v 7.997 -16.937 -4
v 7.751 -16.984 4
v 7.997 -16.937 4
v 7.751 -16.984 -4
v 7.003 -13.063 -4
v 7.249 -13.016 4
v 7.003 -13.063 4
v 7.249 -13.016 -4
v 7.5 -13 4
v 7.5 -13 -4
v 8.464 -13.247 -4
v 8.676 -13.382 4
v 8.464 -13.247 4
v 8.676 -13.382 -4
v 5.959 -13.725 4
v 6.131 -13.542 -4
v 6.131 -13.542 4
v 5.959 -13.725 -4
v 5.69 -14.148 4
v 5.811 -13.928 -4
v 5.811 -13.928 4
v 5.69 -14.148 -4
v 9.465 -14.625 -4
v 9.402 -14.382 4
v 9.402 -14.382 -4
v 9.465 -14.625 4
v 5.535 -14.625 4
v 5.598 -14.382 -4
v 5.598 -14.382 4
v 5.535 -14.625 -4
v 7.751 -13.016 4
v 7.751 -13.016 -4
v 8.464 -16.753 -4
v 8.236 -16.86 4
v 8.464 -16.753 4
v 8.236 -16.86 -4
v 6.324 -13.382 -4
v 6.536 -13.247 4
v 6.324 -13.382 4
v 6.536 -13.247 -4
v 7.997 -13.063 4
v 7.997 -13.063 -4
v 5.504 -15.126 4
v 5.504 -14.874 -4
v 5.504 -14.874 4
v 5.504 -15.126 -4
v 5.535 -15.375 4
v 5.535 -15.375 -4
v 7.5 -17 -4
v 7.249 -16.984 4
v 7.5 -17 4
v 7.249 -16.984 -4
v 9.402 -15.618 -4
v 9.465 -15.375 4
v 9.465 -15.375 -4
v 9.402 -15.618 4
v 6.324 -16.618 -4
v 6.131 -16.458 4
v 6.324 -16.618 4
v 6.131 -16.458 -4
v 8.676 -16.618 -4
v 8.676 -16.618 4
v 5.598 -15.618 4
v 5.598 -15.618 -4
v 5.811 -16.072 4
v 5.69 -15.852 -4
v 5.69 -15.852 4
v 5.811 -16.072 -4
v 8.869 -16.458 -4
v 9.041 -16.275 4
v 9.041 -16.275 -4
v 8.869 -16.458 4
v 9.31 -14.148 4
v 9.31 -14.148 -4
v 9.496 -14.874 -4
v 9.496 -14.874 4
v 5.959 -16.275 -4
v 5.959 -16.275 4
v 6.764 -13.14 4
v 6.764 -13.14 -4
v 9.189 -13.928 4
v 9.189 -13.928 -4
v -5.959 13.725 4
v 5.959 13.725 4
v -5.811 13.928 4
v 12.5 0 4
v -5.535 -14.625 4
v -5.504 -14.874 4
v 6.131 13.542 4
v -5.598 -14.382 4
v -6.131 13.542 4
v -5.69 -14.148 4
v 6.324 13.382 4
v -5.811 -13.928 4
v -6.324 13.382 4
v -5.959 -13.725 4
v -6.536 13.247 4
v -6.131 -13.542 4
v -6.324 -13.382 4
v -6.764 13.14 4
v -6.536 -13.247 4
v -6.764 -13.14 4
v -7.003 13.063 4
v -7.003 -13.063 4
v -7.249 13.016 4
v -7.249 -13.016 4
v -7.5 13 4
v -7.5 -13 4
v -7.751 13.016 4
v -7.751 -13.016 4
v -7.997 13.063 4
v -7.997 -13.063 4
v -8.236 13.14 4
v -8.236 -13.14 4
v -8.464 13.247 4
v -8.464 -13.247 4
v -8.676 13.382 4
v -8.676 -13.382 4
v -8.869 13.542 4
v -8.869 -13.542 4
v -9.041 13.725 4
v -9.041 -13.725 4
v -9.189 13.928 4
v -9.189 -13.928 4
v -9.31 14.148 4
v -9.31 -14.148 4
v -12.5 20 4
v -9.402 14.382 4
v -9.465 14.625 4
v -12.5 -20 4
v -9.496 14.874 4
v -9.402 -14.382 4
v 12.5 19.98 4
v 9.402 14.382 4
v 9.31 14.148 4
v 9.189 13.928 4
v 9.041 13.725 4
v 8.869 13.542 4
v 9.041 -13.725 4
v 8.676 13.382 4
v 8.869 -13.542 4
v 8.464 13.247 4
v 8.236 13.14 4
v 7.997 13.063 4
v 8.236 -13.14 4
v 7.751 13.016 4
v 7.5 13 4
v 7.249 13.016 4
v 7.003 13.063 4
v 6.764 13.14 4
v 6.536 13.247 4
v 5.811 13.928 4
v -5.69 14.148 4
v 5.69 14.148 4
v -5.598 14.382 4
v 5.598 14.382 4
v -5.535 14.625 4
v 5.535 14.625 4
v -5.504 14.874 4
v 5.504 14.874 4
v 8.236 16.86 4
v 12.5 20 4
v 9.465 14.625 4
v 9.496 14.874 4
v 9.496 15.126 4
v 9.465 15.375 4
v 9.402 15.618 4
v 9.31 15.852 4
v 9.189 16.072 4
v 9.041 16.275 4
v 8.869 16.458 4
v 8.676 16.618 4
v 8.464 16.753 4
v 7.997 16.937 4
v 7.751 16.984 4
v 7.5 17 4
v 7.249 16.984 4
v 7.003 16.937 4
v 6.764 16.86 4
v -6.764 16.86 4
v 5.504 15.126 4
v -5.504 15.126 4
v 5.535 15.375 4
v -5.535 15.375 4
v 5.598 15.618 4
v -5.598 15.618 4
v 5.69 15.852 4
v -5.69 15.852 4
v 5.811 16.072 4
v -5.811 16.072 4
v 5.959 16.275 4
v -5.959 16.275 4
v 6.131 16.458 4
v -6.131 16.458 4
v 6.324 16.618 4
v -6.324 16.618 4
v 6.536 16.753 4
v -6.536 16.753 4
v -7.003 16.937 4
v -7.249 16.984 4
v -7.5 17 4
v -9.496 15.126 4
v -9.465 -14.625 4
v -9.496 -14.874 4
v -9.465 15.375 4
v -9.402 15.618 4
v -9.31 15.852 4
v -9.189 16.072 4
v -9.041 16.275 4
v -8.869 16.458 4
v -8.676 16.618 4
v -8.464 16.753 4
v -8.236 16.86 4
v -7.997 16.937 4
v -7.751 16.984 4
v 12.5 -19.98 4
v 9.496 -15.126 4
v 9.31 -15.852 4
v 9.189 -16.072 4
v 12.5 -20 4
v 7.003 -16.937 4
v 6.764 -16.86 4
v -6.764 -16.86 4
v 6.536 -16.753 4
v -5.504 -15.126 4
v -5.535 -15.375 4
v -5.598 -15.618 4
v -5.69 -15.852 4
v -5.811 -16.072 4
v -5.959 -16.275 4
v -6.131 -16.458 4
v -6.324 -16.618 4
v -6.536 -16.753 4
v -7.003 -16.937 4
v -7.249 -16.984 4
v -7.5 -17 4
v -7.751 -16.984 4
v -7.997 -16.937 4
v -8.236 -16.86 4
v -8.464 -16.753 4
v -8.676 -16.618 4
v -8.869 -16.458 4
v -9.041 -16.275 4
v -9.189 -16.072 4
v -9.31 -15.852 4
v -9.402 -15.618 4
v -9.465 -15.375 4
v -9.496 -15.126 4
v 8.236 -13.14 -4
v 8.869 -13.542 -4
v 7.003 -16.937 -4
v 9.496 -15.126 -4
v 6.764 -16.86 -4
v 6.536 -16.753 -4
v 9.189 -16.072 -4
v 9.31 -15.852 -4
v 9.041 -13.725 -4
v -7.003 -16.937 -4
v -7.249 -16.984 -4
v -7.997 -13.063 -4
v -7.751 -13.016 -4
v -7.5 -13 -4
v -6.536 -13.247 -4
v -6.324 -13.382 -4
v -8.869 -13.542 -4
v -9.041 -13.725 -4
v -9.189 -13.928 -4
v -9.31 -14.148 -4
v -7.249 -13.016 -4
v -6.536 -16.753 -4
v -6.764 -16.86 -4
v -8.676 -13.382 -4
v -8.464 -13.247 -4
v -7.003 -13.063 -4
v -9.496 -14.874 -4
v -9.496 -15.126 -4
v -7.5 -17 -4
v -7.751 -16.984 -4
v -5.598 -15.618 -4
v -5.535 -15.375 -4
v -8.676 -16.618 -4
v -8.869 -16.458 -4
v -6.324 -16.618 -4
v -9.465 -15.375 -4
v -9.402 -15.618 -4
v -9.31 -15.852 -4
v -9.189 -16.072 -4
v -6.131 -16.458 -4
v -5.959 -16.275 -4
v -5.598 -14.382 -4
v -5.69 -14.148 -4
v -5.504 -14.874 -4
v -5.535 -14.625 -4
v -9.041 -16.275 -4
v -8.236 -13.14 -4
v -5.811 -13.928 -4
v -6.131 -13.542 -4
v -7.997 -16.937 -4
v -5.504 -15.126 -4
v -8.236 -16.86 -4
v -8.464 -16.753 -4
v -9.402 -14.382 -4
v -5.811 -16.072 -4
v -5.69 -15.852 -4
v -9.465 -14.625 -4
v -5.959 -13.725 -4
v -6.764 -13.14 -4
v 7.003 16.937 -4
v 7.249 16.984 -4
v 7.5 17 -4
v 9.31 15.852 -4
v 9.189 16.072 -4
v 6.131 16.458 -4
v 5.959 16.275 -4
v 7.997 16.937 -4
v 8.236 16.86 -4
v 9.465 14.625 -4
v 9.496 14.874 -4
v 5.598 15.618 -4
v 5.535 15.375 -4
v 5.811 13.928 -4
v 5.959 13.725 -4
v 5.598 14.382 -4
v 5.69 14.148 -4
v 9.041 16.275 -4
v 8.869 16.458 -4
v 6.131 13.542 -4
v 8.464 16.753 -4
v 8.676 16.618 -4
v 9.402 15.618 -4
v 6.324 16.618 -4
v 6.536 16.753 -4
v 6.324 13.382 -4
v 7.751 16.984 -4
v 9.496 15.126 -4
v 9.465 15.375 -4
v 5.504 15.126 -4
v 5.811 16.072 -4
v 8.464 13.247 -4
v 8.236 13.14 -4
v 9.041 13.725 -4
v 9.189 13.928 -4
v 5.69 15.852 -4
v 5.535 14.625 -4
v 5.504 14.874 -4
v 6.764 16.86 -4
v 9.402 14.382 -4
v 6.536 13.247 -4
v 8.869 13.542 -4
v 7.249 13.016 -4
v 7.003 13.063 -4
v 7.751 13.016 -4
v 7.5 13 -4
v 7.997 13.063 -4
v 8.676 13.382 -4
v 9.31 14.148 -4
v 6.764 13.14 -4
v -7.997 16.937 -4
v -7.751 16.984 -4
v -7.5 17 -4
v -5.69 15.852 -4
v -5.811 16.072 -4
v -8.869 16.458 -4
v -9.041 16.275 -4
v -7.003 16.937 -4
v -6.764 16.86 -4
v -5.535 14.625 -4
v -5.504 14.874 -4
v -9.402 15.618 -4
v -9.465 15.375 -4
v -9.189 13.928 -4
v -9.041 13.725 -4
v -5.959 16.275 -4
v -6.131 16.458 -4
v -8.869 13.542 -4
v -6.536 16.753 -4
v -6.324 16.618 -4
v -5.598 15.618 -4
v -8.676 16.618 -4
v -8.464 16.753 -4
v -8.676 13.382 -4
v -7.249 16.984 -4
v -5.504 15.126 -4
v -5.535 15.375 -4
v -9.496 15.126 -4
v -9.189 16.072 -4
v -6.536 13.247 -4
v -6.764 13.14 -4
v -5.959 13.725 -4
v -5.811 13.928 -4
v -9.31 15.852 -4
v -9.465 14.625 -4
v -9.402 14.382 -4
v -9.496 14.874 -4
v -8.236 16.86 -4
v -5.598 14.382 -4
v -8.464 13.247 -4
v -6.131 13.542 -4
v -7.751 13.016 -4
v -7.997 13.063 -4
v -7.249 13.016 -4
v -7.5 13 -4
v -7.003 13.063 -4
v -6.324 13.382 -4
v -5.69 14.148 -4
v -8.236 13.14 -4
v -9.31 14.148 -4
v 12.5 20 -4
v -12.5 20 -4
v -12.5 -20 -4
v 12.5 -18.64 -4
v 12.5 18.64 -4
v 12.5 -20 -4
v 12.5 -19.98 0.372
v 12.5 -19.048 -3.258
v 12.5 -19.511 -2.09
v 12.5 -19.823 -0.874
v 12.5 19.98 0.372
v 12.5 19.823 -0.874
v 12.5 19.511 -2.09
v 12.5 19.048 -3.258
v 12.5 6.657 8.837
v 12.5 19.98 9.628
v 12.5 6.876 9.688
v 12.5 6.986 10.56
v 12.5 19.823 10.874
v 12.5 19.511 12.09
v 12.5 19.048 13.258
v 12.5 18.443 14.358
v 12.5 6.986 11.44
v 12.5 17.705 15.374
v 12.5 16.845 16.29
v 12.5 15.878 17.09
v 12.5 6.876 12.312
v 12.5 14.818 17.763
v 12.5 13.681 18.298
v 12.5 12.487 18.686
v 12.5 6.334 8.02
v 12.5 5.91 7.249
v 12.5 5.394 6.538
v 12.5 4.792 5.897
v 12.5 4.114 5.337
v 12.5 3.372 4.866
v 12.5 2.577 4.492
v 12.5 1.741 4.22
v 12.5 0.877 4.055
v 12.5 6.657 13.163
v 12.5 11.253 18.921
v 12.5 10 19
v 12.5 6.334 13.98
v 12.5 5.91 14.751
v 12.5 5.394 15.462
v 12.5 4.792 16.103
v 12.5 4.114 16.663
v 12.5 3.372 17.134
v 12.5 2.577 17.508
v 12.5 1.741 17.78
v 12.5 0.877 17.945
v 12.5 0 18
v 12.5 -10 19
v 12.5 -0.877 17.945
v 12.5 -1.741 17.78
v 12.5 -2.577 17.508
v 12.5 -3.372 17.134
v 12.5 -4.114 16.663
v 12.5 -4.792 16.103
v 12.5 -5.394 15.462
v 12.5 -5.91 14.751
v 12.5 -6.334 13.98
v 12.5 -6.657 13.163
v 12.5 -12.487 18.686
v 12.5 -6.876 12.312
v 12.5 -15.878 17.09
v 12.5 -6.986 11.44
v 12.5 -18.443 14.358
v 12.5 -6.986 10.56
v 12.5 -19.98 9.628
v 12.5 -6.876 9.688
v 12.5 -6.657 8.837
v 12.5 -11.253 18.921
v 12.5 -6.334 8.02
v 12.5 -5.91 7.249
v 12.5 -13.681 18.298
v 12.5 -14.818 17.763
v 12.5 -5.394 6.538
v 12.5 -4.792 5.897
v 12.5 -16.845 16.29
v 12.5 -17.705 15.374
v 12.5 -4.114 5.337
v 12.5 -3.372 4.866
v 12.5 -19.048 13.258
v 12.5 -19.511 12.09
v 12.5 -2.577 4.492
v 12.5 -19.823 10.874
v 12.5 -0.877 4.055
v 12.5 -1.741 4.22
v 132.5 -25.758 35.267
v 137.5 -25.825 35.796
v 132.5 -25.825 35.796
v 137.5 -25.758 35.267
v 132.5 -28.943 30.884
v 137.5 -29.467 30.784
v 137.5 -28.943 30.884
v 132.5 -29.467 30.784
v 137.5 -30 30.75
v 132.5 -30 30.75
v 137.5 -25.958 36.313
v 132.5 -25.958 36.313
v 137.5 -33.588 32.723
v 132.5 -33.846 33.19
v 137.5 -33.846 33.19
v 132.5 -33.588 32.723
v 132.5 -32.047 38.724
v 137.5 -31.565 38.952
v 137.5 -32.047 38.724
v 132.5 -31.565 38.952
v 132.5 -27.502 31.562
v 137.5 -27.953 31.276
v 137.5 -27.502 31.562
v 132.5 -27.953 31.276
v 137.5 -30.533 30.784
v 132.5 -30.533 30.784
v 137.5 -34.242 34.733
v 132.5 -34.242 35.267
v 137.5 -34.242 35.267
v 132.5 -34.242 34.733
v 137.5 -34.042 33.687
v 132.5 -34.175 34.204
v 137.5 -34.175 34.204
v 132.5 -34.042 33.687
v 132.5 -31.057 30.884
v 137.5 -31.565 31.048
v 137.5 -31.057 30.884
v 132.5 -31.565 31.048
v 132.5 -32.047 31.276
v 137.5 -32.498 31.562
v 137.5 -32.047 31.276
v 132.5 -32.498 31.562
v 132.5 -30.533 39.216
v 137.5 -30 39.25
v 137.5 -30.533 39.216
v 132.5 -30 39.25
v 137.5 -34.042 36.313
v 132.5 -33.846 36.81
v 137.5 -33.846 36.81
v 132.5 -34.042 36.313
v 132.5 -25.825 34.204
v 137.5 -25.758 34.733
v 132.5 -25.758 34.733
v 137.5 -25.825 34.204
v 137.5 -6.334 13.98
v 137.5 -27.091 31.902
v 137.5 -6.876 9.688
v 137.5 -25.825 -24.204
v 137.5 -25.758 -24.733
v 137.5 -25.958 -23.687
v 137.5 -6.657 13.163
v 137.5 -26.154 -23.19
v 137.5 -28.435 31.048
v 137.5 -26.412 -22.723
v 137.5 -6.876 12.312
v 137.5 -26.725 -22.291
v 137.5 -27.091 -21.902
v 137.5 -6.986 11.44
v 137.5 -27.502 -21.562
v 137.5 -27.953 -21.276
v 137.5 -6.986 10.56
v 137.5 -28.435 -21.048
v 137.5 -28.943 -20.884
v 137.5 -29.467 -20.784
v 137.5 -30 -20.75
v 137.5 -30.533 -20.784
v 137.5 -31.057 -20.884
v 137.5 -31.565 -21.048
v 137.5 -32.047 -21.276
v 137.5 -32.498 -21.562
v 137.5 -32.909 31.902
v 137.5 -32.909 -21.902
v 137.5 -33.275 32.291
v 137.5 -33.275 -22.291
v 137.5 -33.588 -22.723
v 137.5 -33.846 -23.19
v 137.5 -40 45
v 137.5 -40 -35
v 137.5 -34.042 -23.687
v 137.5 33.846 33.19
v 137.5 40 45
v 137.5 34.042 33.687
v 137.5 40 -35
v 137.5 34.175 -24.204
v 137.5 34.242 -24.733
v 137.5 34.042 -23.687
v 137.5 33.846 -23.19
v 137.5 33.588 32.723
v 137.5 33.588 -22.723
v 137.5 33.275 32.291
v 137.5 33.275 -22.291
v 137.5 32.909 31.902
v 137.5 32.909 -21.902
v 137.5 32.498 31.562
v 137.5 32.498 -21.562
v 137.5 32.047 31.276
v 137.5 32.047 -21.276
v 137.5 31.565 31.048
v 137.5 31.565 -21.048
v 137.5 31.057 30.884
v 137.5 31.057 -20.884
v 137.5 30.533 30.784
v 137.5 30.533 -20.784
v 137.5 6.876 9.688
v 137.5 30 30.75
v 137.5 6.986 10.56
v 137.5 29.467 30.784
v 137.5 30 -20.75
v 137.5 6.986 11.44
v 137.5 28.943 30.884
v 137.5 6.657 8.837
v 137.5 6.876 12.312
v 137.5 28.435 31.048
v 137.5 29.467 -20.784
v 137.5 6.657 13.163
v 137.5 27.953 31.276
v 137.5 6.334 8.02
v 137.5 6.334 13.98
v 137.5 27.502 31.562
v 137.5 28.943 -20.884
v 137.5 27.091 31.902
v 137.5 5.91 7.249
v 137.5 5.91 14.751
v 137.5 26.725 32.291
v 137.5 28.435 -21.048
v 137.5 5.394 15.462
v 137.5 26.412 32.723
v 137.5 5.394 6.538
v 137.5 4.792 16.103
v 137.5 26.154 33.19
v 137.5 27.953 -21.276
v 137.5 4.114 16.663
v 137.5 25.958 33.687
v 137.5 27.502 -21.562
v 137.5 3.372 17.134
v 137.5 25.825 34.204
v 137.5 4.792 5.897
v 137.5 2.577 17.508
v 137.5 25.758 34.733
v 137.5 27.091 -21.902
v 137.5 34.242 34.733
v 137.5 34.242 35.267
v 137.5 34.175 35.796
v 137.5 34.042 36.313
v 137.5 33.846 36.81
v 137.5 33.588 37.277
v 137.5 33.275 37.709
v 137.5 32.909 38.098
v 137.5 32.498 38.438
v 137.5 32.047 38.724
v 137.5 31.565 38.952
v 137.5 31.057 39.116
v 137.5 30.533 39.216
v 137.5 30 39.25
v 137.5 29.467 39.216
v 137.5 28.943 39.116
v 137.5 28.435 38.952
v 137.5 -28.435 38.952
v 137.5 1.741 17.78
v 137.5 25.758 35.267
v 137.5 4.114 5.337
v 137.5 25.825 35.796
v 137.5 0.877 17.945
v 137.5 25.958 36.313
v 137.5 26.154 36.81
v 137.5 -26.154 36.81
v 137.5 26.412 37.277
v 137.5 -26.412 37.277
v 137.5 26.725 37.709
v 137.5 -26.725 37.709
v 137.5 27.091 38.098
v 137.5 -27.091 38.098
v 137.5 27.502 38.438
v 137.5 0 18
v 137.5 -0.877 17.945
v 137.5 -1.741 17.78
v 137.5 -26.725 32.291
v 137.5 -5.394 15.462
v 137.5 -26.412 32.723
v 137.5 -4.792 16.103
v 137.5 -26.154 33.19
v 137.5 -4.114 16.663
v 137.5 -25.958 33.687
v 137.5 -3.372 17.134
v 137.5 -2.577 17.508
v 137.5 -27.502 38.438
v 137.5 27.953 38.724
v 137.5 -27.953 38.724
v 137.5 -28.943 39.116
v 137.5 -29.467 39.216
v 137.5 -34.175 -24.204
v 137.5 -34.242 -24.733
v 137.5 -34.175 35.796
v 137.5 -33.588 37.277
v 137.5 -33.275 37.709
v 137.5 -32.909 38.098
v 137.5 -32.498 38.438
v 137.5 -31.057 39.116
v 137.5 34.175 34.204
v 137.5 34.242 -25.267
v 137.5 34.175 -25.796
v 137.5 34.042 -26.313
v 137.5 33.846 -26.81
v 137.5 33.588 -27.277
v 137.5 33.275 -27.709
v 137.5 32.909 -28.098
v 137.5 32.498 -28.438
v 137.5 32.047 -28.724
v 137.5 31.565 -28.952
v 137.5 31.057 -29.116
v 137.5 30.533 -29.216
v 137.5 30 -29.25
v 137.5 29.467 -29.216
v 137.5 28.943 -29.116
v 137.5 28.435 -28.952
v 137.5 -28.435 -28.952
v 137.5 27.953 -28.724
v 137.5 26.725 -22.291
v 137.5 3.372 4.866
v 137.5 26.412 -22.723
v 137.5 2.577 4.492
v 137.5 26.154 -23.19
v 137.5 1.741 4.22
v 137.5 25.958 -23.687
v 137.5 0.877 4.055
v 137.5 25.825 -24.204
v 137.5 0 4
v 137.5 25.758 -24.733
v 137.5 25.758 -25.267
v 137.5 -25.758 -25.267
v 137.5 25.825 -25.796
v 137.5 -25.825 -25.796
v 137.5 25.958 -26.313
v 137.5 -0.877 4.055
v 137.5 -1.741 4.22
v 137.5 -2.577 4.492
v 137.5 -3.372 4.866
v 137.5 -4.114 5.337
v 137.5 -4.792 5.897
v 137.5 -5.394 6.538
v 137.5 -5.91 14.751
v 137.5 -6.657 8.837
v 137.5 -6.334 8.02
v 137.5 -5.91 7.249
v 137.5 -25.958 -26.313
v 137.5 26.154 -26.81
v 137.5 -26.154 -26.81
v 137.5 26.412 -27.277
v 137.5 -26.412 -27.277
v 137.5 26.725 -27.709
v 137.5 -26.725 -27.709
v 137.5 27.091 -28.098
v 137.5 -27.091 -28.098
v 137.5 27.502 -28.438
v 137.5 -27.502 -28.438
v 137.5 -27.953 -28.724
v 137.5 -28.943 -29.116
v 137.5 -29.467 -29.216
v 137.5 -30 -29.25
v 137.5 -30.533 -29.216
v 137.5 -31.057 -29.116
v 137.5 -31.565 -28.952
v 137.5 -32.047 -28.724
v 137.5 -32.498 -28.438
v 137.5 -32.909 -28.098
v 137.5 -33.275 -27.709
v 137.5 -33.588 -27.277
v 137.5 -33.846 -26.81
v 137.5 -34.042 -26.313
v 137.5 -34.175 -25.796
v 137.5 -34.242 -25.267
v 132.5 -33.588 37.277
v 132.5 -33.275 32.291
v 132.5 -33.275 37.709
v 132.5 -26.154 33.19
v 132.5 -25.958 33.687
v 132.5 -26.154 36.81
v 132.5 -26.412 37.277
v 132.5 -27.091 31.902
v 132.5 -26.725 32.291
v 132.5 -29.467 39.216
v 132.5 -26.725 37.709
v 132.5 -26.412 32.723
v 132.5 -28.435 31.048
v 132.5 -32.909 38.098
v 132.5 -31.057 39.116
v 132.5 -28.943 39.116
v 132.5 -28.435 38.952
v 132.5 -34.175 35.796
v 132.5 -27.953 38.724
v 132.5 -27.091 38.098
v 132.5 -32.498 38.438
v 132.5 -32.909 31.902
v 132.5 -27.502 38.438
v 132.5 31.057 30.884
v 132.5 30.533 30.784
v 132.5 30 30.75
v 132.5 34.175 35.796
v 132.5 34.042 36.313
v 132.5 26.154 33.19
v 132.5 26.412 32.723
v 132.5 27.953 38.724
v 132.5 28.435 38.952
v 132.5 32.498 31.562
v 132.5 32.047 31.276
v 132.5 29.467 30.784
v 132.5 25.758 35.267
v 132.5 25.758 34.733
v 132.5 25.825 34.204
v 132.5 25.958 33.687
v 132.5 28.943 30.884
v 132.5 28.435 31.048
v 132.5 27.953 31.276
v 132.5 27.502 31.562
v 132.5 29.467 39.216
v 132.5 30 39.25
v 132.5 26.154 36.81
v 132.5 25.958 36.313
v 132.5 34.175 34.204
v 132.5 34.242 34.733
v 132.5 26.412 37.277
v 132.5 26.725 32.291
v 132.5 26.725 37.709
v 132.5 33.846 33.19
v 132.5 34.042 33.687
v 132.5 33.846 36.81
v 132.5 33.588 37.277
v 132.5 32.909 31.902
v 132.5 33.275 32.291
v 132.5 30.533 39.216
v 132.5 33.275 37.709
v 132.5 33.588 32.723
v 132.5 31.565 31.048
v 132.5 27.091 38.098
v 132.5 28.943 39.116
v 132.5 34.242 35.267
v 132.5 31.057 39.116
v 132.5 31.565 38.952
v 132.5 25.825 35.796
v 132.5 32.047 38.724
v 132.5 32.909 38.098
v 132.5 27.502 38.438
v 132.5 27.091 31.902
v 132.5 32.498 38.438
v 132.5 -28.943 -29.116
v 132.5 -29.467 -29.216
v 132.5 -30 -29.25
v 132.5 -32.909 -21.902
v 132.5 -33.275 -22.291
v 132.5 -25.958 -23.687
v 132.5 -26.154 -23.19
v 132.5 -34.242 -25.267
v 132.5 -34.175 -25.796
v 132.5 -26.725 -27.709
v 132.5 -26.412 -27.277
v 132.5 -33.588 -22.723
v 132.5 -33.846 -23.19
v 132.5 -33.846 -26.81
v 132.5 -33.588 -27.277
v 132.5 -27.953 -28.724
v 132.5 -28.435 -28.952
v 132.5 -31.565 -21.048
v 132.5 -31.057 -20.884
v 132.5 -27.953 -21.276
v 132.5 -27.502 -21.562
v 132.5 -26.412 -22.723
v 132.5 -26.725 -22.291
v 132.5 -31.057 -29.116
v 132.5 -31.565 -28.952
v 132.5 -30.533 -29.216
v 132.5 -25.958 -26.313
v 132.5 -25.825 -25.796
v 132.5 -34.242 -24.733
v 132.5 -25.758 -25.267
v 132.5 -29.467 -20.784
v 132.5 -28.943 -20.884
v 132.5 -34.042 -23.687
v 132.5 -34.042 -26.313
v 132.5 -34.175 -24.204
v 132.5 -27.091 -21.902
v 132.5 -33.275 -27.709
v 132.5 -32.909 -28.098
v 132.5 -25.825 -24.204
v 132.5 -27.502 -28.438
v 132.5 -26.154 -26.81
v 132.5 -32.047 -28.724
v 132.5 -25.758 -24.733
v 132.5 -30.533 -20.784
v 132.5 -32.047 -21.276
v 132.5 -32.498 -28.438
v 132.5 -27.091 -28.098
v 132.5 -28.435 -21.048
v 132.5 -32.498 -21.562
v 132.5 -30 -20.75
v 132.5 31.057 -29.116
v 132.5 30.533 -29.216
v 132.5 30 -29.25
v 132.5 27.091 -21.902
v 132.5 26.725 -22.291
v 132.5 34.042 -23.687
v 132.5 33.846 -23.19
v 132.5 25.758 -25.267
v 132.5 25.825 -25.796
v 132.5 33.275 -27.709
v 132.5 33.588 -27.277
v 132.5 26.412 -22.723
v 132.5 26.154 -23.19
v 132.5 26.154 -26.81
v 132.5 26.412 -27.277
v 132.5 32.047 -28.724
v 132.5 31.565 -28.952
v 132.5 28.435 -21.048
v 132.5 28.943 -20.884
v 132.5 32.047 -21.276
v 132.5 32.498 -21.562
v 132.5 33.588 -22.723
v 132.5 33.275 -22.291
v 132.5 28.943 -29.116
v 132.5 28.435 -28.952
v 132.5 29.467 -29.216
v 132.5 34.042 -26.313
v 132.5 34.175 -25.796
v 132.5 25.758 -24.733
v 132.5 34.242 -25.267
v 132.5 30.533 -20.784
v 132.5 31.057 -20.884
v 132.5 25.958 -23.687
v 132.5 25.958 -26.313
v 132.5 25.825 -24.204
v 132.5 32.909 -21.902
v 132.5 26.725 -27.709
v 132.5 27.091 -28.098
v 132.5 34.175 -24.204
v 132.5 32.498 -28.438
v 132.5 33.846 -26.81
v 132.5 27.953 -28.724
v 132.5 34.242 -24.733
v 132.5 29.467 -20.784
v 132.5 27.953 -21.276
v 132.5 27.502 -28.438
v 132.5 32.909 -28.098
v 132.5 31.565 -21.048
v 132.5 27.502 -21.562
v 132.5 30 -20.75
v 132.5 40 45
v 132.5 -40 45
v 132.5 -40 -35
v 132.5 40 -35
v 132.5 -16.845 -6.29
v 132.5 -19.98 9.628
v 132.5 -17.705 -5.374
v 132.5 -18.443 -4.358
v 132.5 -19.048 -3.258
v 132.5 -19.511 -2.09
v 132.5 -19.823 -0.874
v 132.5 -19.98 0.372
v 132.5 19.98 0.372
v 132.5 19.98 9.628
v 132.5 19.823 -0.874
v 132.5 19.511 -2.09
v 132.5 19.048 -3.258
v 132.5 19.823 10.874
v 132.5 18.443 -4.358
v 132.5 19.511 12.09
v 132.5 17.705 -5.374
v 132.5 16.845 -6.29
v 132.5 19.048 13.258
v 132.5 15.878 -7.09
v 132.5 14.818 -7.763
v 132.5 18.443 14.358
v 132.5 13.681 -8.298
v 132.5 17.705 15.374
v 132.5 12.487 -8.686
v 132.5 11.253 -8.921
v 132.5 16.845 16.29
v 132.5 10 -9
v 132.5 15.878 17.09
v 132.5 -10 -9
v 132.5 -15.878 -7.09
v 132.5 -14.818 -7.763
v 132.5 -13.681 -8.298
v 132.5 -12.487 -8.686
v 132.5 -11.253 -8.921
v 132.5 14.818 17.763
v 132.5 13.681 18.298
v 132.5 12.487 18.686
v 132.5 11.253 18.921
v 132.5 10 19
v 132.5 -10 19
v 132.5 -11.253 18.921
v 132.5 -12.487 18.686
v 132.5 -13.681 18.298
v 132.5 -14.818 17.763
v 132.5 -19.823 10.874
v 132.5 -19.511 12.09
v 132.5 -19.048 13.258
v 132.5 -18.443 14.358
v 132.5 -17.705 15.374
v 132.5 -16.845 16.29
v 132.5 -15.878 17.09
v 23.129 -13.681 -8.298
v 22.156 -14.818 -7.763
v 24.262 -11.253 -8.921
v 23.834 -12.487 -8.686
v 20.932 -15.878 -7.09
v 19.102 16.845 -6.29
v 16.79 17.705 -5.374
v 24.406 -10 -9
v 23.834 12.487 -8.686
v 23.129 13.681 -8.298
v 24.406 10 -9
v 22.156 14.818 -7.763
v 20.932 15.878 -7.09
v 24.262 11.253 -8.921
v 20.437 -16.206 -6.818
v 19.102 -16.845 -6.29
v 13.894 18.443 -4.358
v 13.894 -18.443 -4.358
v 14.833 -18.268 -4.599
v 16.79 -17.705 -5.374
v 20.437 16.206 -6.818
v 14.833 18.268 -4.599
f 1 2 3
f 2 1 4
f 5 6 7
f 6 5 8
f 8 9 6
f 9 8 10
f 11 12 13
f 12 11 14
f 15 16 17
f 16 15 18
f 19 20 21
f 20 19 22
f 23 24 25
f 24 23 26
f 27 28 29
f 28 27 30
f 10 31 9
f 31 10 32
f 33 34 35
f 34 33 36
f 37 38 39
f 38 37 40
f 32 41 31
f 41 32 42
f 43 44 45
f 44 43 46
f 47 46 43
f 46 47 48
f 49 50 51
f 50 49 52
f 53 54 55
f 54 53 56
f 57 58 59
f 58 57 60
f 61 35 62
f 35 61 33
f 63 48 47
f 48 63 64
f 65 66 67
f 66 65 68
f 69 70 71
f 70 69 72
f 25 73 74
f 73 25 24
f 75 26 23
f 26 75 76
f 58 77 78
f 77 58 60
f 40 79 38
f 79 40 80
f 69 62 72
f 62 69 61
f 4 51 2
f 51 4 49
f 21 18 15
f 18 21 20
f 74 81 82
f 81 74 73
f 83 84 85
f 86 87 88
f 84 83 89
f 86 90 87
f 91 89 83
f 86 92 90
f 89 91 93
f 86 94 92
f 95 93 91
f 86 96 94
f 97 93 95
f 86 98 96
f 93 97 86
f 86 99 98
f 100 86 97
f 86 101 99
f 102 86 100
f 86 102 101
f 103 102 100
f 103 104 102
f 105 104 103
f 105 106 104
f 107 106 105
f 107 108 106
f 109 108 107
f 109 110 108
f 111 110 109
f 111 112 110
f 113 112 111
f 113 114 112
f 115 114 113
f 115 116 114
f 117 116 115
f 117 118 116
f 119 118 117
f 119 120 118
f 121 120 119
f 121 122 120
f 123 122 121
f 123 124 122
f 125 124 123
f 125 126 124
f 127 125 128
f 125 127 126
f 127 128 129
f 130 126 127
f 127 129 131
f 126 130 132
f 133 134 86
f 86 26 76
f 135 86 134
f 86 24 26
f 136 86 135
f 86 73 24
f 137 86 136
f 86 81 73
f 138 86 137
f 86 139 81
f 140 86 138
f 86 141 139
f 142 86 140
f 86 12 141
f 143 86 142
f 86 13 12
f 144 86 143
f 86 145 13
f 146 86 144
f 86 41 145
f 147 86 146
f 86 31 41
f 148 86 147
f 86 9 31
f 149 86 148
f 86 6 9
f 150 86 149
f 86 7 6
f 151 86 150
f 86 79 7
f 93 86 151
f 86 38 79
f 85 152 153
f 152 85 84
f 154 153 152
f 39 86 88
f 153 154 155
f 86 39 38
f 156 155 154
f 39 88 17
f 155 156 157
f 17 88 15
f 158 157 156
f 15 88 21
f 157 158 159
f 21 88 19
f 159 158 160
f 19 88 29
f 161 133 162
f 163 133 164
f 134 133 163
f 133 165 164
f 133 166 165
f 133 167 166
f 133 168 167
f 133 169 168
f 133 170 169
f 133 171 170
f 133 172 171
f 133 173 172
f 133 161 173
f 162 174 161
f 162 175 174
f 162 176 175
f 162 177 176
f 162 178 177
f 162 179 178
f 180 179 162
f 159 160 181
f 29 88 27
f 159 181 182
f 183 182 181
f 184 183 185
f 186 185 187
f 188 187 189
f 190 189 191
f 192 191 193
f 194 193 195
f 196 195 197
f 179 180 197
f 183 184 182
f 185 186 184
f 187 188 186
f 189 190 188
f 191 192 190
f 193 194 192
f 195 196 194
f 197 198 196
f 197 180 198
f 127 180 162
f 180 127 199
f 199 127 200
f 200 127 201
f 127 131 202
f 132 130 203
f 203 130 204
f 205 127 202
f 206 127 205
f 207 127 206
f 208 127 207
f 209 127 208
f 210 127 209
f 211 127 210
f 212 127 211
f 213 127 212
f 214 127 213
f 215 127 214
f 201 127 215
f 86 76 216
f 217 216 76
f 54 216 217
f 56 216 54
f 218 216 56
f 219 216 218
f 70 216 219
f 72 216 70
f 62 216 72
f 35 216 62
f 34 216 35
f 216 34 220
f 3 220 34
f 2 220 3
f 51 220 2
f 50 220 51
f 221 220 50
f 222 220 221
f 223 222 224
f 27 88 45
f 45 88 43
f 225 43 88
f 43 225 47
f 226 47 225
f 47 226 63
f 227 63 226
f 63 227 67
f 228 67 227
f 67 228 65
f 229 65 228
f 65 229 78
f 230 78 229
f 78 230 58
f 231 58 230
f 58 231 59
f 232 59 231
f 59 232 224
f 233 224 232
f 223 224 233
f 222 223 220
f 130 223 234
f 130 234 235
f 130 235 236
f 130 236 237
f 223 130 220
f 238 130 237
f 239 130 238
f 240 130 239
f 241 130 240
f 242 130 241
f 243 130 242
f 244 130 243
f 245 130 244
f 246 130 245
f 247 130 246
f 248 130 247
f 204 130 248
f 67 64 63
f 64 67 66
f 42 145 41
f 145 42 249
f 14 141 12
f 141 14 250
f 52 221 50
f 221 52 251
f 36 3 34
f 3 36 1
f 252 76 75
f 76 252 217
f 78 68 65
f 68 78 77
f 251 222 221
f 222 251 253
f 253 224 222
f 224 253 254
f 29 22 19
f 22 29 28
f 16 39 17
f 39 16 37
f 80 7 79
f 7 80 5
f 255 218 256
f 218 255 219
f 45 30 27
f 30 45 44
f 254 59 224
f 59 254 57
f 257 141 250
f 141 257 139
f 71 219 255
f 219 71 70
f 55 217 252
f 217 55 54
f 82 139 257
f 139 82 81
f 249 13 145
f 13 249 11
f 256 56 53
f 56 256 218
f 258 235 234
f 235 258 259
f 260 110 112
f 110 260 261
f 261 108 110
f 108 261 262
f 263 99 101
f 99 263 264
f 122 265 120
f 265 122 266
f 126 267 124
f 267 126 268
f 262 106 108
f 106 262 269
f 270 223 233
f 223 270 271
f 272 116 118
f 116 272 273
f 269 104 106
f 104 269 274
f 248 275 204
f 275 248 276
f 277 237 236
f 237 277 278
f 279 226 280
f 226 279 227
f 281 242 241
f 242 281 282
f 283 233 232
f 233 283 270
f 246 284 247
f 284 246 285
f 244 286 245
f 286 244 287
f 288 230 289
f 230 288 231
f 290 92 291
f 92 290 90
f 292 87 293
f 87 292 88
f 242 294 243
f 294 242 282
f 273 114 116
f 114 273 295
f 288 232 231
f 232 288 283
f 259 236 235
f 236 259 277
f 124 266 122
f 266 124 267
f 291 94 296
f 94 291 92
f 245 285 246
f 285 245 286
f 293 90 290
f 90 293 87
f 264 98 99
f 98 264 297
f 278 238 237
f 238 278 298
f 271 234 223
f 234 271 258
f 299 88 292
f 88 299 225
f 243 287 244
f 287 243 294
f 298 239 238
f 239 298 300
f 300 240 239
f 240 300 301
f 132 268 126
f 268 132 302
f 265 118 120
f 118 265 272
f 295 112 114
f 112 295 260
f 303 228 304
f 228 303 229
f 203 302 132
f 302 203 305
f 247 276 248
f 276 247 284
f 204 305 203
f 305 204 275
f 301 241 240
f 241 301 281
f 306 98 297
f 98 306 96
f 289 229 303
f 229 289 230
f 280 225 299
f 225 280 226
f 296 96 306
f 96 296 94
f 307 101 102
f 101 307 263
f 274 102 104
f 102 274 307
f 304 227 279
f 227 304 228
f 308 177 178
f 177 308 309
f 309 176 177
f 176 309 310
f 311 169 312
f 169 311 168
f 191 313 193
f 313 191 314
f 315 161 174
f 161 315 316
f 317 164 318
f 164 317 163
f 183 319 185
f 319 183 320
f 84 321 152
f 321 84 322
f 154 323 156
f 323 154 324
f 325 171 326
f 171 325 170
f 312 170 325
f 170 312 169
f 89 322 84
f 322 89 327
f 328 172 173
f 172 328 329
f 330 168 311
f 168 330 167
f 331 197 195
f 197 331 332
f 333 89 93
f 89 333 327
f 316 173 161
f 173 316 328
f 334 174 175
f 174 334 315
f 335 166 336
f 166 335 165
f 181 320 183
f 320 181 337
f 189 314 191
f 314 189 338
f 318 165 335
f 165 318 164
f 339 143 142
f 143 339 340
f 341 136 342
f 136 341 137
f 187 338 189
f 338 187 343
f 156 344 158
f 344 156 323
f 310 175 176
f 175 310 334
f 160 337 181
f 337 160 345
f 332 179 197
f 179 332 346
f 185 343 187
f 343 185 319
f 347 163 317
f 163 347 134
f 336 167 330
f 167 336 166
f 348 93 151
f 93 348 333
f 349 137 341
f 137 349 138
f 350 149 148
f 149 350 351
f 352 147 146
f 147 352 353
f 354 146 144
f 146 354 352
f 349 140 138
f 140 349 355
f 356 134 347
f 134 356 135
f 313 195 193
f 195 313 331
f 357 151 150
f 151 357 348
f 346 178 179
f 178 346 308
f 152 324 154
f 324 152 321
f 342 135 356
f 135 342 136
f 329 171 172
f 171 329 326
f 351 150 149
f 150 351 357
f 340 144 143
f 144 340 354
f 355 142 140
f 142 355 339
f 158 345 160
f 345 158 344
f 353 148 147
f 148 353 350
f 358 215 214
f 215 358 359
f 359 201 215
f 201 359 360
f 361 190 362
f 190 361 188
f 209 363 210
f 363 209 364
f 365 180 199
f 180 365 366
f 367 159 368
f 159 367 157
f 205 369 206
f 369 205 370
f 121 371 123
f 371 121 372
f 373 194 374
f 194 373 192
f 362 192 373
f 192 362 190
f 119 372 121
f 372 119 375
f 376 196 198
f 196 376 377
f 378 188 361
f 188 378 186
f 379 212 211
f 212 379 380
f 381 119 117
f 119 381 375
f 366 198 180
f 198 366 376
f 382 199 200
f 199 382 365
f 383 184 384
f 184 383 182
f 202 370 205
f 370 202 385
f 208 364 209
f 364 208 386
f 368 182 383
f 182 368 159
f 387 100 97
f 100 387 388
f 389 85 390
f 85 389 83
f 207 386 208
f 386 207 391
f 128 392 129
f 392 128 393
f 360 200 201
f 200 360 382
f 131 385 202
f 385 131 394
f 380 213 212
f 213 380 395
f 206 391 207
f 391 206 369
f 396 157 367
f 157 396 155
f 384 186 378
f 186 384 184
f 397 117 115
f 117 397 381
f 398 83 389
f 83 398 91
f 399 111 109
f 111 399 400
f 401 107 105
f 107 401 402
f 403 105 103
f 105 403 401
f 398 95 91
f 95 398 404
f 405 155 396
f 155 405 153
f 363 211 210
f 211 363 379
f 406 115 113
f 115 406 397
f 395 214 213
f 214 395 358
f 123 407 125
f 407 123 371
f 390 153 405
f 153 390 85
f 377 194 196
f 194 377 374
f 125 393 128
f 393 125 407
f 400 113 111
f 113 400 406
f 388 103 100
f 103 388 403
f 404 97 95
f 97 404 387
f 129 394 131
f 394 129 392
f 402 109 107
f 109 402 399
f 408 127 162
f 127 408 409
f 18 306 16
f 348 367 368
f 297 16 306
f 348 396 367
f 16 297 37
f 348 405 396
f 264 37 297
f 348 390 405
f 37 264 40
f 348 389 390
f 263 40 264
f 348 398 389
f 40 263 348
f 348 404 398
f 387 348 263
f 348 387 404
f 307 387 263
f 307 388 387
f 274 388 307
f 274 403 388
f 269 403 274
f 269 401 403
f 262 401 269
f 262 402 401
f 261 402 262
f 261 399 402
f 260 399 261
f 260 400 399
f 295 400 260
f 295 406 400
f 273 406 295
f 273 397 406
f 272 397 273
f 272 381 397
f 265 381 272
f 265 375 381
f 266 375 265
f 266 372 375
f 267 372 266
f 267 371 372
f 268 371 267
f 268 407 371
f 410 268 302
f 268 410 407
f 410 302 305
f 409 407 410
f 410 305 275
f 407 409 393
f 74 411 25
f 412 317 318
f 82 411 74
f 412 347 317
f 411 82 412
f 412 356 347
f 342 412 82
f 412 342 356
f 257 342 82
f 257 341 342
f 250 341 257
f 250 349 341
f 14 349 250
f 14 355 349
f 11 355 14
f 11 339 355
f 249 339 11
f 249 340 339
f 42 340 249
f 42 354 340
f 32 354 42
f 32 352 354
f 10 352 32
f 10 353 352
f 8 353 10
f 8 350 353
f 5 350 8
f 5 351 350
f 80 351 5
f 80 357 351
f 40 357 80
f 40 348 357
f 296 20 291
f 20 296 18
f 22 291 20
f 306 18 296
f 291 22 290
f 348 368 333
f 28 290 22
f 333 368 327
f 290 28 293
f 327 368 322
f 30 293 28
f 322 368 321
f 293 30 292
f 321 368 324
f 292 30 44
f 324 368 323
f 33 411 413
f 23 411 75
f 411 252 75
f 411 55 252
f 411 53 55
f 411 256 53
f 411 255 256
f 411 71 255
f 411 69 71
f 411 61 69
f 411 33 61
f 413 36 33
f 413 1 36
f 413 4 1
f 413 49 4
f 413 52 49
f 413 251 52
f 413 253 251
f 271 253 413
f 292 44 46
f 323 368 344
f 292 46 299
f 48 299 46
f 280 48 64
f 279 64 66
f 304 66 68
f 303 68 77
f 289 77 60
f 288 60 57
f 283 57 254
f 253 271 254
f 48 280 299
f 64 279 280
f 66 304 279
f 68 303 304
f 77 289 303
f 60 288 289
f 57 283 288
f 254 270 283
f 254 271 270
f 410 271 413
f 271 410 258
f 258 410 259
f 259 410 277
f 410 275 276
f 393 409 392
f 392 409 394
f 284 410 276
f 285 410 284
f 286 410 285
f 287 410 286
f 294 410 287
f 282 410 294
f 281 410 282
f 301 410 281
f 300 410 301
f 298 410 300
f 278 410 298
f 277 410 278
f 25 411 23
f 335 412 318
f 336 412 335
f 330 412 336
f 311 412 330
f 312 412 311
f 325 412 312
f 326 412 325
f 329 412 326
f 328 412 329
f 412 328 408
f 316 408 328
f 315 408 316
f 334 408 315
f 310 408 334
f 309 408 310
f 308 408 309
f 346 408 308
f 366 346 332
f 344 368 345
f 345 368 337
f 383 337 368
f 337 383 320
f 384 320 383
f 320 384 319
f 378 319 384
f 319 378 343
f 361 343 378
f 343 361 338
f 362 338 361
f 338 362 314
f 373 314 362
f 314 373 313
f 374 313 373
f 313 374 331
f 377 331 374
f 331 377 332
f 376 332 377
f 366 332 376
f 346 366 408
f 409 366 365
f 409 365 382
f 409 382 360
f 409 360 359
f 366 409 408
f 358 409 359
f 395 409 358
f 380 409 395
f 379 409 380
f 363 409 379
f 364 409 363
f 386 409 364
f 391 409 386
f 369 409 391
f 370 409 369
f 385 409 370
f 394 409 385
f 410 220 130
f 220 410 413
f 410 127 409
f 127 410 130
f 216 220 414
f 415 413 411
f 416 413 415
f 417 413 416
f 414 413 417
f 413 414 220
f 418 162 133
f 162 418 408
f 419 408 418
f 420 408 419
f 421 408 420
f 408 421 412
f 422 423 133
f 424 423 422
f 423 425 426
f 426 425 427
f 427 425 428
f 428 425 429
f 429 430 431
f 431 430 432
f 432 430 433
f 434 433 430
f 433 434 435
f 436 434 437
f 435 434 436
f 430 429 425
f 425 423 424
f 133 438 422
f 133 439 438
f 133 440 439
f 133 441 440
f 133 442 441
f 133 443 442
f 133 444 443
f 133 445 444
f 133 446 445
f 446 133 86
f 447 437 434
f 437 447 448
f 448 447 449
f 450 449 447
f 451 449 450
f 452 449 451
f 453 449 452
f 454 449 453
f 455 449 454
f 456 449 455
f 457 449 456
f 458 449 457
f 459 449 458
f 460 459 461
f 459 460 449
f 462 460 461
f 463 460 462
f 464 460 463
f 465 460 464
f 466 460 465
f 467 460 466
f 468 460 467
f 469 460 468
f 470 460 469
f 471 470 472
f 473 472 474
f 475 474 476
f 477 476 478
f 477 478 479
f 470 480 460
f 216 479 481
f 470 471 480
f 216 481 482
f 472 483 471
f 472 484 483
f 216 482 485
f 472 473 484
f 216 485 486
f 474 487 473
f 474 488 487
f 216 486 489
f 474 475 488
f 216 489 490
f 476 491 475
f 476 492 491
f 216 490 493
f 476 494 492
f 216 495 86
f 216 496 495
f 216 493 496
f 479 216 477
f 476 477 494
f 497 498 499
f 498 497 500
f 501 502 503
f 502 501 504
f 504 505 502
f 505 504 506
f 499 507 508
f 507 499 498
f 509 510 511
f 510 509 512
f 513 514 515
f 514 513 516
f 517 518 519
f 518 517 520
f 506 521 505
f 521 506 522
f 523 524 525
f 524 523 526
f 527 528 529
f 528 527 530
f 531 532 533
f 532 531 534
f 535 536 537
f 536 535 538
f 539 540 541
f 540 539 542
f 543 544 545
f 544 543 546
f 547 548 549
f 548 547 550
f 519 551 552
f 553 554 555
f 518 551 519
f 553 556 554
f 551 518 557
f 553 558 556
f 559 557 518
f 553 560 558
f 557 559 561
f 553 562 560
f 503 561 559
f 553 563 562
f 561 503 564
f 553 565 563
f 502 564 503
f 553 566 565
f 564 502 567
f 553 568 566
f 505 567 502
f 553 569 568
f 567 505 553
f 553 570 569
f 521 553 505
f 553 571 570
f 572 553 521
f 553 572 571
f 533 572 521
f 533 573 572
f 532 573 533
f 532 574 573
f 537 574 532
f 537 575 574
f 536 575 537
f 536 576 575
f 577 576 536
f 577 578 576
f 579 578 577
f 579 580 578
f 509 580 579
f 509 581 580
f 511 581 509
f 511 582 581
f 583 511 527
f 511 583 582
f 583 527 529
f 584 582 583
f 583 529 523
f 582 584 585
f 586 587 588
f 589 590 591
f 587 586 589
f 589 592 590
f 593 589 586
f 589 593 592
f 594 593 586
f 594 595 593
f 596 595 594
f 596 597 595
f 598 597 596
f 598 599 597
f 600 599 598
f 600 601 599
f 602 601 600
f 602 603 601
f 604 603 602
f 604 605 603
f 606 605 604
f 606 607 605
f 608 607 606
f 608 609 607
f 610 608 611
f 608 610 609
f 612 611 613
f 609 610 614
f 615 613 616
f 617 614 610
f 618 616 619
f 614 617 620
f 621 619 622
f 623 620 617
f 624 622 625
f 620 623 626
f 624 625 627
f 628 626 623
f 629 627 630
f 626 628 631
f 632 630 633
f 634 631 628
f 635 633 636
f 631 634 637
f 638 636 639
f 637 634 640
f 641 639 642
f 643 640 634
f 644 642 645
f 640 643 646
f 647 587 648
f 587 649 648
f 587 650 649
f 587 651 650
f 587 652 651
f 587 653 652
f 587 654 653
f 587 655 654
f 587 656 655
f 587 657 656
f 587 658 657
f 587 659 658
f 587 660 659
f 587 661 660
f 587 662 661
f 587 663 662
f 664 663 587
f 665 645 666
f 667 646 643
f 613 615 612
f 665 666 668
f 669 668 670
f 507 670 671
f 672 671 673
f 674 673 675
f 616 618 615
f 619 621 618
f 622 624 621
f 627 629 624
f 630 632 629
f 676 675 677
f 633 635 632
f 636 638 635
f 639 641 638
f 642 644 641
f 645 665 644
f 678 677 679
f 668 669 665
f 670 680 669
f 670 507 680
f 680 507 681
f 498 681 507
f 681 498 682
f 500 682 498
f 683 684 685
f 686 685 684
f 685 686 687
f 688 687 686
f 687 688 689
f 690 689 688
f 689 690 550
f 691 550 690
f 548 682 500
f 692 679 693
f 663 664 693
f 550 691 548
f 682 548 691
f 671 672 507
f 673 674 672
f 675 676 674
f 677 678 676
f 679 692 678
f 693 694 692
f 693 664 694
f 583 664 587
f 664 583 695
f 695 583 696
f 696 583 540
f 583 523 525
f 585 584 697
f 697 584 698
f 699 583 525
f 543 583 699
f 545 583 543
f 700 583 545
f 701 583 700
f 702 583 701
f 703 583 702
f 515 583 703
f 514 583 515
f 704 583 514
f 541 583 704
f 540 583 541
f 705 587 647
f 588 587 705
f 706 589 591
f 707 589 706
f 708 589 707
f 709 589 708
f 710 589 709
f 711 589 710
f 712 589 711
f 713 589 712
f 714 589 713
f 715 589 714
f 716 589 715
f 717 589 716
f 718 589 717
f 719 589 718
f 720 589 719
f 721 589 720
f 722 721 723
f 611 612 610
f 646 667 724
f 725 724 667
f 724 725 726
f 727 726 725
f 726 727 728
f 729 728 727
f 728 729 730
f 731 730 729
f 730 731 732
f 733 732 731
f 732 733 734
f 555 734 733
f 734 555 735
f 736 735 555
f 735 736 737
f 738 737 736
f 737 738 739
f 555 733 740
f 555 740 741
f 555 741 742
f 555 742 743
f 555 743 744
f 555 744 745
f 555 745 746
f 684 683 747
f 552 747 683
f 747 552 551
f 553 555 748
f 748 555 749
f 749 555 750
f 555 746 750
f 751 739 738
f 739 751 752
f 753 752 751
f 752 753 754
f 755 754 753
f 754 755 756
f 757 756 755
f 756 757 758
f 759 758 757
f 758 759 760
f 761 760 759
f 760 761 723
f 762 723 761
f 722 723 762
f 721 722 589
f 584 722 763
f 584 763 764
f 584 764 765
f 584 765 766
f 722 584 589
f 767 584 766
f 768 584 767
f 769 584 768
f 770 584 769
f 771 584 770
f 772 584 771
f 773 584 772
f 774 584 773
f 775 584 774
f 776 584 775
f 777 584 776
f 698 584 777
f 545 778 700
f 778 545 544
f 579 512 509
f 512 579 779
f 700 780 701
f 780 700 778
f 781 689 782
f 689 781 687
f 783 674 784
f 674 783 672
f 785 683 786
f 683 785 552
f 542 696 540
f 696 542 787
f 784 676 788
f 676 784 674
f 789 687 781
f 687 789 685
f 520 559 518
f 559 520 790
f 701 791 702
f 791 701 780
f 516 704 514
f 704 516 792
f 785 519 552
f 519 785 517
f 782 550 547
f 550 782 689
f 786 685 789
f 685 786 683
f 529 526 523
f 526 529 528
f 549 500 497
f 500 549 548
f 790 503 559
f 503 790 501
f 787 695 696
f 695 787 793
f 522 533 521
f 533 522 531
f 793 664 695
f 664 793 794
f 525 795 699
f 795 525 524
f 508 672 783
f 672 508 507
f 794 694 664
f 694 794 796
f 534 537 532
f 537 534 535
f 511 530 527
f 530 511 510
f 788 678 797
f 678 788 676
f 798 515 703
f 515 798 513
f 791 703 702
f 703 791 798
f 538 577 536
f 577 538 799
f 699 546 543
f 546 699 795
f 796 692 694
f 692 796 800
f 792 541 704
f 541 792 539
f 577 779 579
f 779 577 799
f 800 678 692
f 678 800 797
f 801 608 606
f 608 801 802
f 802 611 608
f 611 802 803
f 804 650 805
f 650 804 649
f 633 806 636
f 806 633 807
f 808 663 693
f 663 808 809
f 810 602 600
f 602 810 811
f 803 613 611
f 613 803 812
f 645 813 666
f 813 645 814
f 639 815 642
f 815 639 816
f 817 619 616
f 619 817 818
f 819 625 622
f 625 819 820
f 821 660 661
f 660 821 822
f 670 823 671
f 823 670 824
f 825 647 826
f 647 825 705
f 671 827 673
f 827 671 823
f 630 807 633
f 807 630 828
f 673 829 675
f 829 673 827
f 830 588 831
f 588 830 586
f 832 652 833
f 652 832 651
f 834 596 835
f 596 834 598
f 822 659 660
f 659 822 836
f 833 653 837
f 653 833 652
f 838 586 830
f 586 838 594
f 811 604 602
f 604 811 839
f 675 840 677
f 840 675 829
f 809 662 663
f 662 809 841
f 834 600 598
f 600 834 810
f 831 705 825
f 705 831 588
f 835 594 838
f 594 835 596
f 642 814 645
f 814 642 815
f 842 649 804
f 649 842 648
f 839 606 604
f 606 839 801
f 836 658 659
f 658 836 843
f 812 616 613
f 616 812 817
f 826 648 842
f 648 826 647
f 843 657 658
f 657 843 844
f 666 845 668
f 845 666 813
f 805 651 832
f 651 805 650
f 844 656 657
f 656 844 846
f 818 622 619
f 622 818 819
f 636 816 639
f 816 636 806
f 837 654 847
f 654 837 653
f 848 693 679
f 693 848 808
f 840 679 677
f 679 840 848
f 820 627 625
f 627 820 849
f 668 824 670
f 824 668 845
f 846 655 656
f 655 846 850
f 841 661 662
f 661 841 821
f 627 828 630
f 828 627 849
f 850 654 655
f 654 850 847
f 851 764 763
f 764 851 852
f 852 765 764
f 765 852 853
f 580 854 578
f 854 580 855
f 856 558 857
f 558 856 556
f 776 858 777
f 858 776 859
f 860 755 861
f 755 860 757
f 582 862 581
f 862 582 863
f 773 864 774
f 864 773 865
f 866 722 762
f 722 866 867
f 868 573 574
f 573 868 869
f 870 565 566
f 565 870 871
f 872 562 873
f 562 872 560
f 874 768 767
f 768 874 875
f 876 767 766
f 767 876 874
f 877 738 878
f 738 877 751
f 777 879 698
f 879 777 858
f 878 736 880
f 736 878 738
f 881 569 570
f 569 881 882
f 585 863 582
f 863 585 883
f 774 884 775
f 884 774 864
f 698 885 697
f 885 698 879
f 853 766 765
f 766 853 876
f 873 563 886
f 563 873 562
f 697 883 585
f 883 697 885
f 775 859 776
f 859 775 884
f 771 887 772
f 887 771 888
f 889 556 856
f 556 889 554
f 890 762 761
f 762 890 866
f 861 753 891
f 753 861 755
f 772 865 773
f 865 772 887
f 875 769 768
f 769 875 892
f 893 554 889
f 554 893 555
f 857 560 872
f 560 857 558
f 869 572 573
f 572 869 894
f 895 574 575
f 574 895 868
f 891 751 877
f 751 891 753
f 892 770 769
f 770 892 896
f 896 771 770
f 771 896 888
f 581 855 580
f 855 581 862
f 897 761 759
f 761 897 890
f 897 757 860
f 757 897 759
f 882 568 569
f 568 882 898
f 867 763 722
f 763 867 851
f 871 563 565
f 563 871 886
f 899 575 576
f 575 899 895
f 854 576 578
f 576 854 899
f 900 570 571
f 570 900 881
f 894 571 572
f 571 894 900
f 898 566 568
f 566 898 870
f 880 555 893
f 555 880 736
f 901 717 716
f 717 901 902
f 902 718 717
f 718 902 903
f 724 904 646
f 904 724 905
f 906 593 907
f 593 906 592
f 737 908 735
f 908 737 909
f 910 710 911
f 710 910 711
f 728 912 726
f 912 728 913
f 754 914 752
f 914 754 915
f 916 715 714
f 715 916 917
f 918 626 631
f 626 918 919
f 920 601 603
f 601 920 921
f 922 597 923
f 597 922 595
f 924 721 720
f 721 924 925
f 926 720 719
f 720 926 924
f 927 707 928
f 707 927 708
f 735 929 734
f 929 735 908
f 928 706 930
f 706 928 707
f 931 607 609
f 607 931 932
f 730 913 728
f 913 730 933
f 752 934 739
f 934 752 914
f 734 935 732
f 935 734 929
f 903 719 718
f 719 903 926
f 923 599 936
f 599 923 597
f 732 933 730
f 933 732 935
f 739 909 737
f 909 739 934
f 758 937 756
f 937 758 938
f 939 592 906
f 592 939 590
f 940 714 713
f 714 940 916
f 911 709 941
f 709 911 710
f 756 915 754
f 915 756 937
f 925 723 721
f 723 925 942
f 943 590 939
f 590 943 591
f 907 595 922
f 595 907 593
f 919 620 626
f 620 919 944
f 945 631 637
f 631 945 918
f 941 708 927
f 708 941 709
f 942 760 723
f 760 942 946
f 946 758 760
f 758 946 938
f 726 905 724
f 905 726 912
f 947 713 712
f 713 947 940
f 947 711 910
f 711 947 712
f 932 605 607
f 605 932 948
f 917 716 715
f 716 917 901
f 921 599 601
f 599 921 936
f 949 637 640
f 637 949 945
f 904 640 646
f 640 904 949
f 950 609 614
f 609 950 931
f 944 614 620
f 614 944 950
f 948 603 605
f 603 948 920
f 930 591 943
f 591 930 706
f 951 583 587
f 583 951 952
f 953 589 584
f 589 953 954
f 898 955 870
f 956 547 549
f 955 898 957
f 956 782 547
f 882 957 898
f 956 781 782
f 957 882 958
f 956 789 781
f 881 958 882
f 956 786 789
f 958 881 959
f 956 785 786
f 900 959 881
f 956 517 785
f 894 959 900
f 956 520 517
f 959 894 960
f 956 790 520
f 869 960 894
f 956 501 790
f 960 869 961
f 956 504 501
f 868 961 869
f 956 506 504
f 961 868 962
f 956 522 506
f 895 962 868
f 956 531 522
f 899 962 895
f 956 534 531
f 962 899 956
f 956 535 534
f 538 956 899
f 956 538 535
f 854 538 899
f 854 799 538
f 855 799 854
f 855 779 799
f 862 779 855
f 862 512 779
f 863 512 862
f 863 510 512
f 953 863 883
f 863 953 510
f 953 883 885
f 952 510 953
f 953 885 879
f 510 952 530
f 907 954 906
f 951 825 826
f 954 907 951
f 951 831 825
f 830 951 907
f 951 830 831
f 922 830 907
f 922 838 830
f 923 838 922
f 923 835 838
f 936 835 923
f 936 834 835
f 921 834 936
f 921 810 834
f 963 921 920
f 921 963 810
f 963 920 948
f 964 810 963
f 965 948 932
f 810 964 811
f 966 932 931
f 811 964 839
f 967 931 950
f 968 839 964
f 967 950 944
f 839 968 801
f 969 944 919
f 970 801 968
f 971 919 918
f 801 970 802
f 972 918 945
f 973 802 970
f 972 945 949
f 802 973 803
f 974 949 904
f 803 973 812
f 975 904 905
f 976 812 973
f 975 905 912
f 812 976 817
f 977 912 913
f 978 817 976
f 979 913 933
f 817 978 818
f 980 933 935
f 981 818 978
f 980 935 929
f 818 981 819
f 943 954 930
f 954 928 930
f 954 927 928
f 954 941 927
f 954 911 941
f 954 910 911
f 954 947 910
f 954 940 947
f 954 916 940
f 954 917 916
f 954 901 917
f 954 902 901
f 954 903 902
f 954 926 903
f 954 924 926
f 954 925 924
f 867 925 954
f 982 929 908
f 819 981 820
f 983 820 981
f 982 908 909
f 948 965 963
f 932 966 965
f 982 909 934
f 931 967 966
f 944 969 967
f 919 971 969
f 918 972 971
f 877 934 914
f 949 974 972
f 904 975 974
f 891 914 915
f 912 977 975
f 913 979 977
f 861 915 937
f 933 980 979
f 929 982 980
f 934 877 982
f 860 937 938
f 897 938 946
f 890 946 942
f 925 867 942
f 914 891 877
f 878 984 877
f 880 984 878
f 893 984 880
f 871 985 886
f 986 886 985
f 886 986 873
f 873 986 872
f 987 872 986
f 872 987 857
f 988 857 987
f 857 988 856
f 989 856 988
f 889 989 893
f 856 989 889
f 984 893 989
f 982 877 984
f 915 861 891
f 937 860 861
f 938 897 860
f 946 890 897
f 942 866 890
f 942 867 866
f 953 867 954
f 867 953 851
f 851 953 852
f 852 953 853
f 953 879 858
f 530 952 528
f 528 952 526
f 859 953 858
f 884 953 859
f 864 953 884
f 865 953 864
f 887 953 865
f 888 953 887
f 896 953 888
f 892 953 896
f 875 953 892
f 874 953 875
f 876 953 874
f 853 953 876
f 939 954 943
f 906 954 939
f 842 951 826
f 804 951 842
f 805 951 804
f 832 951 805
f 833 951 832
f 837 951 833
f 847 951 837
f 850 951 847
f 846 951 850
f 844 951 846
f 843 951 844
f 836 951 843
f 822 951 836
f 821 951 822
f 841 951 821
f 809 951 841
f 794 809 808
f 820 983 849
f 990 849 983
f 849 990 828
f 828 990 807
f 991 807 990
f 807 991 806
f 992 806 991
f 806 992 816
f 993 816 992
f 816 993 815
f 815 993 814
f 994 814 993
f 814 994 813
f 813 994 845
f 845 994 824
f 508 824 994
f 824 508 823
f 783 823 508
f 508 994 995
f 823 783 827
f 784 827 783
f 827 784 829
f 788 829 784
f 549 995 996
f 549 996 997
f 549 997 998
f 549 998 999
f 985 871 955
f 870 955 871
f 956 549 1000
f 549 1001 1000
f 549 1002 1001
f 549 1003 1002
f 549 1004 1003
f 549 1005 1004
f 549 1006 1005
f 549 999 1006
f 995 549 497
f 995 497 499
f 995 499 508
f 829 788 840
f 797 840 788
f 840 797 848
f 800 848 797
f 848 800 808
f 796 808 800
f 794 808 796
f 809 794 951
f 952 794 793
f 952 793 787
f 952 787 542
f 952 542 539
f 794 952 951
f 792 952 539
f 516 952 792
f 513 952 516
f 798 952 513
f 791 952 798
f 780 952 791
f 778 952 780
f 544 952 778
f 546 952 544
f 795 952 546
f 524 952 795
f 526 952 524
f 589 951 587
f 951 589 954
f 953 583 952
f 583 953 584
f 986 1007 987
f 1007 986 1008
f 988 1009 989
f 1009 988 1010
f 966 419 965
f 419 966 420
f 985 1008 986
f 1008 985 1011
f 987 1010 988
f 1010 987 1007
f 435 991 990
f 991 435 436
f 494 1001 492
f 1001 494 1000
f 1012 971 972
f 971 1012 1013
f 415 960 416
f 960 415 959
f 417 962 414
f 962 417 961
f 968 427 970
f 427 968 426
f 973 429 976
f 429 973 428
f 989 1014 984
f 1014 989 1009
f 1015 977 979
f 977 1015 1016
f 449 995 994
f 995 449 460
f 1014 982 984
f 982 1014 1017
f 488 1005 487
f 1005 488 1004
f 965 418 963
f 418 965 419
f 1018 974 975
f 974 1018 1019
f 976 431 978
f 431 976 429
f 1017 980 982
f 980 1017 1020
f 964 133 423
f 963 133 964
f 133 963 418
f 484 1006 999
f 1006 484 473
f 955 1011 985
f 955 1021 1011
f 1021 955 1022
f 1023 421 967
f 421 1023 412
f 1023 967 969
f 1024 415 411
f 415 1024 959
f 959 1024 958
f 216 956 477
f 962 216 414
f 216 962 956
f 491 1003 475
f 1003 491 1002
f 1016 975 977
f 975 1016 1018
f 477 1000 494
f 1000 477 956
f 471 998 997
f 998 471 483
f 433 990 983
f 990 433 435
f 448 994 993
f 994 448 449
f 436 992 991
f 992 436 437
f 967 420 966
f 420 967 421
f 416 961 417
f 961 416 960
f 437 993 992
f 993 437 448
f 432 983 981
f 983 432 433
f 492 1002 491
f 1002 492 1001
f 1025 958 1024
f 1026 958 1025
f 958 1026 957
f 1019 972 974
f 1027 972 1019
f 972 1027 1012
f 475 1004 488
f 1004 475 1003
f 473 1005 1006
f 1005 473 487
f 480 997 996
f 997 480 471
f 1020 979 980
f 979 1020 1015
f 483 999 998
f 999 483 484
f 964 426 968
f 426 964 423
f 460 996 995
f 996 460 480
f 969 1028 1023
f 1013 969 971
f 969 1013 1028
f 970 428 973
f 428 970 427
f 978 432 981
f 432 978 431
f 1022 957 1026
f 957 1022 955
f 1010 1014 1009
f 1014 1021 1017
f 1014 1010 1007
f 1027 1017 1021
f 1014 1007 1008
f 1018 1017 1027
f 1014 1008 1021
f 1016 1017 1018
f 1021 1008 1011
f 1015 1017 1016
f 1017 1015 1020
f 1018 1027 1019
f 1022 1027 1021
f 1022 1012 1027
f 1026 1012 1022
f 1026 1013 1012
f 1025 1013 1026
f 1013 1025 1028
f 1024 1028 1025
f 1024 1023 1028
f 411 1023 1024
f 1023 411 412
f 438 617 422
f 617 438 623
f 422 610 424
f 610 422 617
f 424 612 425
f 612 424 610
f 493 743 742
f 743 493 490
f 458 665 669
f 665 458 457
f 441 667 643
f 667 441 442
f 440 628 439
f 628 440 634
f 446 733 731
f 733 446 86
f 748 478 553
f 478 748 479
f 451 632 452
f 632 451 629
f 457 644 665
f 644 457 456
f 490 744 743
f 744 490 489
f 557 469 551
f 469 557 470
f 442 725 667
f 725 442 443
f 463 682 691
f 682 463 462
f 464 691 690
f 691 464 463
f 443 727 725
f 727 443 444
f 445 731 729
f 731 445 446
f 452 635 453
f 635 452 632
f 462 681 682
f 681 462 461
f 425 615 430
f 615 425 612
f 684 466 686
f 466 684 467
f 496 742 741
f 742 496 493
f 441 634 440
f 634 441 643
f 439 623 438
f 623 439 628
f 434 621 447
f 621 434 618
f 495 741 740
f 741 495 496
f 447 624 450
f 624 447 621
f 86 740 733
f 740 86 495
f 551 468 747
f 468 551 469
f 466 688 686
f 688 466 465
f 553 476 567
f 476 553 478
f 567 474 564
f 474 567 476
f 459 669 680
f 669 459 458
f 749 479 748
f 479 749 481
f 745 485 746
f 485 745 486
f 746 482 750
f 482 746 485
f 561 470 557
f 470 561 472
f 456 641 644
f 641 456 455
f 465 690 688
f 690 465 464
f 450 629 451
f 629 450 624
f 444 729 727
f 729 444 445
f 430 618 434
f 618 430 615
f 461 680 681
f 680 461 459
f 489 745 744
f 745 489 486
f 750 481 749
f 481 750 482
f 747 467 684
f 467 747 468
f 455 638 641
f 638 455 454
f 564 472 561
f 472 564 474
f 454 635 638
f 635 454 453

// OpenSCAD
$fn=50;

module corner_holes(x_dist, y_dist, radius, depth){
    for(i = [0:1]){
        for(j = [0:1]){
            translate([i * x_dist - x_dist / 2, j * y_dist - y_dist / 2, 0])
            cylinder(depth, r1=radius, r2=radius, center=true);
        }
    }
}

module rounded_cube(width, length, height, corner_radius){
    translate([length / 2, corner_radius, height / 2 - corner_radius])
    rotate([0, 90, 0])
    hull(){
        for(i = [0:1]){
        for(j = [0:1]){
            translate([i * height - height / 2 - 2 * i * corner_radius, j * width - width / 2 - 2 * j * corner_radius, 0])
            cylinder(length, r1=corner_radius, r2=corner_radius, center=true);
        }
    }
    }
}

length = 125;
corner_radius = 10;
width = 40;
height = 28;
height_offset = 5;

inner_radius = 7;
center_hole_offset = 9;

hole_radius = 2;

hole_x_dist = 30;
hole_y_dist = 15;

plate_width = 40;
plate_depth = 25;
plate_height = 8;

thruster_radius = 48;

mounting_plate_size = 80;
mounting_plate_depth = 5;
mounting_plate_hole_radius = 4.25;


// Mounting point
translate([0, 0, -plate_height / 2])
rotate([0, 0, 90])
difference(){
    // Create plate
    translate([-width/2, -plate_depth/2, 0])
    cube([width, plate_depth, plate_height]);

    corner_holes(hole_x_dist, hole_y_dist, hole_radius, plate_height * 2);
}

// Handle
difference(){
    cube_width = width - 2 * corner_radius;
    cube_height = height - 2 * corner_radius;
    
    union(){
        translate([plate_depth / 2, 0, -height / 2 + height_offset])
        rounded_cube(width, length, height, corner_radius);
        
        // Mounting plate

        difference(){
        translate([length + mounting_plate_depth * 1.5, -mounting_plate_size / 2, -mounting_plate_size / 2 + height_offset])
        cube([mounting_plate_depth, mounting_plate_size, mounting_plate_size]);
            
            hole_spacing = mounting_plate_size - 20;
            
            translate([length + mounting_plate_depth * 1.5, 0, height_offset])
            rotate([0, 90, 0])
            corner_holes(hole_spacing, hole_spacing, mounting_plate_hole_radius, mounting_plate_depth * 2);
        }
    }
    
    // Thruster
    translate([0, 0, -thruster_radius - plate_height / 2 + 1.75])
    rotate([90, 0, 0])
    cylinder(width, thruster_radius, thruster_radius, center=true);
    
    // Center hole
    translate([plate_depth / 2, 0, height - plate_height - center_hole_offset])
    rotate([0, 90, 0])
    cylinder(h = length + mounting_plate_depth, r = inner_radius);
}
